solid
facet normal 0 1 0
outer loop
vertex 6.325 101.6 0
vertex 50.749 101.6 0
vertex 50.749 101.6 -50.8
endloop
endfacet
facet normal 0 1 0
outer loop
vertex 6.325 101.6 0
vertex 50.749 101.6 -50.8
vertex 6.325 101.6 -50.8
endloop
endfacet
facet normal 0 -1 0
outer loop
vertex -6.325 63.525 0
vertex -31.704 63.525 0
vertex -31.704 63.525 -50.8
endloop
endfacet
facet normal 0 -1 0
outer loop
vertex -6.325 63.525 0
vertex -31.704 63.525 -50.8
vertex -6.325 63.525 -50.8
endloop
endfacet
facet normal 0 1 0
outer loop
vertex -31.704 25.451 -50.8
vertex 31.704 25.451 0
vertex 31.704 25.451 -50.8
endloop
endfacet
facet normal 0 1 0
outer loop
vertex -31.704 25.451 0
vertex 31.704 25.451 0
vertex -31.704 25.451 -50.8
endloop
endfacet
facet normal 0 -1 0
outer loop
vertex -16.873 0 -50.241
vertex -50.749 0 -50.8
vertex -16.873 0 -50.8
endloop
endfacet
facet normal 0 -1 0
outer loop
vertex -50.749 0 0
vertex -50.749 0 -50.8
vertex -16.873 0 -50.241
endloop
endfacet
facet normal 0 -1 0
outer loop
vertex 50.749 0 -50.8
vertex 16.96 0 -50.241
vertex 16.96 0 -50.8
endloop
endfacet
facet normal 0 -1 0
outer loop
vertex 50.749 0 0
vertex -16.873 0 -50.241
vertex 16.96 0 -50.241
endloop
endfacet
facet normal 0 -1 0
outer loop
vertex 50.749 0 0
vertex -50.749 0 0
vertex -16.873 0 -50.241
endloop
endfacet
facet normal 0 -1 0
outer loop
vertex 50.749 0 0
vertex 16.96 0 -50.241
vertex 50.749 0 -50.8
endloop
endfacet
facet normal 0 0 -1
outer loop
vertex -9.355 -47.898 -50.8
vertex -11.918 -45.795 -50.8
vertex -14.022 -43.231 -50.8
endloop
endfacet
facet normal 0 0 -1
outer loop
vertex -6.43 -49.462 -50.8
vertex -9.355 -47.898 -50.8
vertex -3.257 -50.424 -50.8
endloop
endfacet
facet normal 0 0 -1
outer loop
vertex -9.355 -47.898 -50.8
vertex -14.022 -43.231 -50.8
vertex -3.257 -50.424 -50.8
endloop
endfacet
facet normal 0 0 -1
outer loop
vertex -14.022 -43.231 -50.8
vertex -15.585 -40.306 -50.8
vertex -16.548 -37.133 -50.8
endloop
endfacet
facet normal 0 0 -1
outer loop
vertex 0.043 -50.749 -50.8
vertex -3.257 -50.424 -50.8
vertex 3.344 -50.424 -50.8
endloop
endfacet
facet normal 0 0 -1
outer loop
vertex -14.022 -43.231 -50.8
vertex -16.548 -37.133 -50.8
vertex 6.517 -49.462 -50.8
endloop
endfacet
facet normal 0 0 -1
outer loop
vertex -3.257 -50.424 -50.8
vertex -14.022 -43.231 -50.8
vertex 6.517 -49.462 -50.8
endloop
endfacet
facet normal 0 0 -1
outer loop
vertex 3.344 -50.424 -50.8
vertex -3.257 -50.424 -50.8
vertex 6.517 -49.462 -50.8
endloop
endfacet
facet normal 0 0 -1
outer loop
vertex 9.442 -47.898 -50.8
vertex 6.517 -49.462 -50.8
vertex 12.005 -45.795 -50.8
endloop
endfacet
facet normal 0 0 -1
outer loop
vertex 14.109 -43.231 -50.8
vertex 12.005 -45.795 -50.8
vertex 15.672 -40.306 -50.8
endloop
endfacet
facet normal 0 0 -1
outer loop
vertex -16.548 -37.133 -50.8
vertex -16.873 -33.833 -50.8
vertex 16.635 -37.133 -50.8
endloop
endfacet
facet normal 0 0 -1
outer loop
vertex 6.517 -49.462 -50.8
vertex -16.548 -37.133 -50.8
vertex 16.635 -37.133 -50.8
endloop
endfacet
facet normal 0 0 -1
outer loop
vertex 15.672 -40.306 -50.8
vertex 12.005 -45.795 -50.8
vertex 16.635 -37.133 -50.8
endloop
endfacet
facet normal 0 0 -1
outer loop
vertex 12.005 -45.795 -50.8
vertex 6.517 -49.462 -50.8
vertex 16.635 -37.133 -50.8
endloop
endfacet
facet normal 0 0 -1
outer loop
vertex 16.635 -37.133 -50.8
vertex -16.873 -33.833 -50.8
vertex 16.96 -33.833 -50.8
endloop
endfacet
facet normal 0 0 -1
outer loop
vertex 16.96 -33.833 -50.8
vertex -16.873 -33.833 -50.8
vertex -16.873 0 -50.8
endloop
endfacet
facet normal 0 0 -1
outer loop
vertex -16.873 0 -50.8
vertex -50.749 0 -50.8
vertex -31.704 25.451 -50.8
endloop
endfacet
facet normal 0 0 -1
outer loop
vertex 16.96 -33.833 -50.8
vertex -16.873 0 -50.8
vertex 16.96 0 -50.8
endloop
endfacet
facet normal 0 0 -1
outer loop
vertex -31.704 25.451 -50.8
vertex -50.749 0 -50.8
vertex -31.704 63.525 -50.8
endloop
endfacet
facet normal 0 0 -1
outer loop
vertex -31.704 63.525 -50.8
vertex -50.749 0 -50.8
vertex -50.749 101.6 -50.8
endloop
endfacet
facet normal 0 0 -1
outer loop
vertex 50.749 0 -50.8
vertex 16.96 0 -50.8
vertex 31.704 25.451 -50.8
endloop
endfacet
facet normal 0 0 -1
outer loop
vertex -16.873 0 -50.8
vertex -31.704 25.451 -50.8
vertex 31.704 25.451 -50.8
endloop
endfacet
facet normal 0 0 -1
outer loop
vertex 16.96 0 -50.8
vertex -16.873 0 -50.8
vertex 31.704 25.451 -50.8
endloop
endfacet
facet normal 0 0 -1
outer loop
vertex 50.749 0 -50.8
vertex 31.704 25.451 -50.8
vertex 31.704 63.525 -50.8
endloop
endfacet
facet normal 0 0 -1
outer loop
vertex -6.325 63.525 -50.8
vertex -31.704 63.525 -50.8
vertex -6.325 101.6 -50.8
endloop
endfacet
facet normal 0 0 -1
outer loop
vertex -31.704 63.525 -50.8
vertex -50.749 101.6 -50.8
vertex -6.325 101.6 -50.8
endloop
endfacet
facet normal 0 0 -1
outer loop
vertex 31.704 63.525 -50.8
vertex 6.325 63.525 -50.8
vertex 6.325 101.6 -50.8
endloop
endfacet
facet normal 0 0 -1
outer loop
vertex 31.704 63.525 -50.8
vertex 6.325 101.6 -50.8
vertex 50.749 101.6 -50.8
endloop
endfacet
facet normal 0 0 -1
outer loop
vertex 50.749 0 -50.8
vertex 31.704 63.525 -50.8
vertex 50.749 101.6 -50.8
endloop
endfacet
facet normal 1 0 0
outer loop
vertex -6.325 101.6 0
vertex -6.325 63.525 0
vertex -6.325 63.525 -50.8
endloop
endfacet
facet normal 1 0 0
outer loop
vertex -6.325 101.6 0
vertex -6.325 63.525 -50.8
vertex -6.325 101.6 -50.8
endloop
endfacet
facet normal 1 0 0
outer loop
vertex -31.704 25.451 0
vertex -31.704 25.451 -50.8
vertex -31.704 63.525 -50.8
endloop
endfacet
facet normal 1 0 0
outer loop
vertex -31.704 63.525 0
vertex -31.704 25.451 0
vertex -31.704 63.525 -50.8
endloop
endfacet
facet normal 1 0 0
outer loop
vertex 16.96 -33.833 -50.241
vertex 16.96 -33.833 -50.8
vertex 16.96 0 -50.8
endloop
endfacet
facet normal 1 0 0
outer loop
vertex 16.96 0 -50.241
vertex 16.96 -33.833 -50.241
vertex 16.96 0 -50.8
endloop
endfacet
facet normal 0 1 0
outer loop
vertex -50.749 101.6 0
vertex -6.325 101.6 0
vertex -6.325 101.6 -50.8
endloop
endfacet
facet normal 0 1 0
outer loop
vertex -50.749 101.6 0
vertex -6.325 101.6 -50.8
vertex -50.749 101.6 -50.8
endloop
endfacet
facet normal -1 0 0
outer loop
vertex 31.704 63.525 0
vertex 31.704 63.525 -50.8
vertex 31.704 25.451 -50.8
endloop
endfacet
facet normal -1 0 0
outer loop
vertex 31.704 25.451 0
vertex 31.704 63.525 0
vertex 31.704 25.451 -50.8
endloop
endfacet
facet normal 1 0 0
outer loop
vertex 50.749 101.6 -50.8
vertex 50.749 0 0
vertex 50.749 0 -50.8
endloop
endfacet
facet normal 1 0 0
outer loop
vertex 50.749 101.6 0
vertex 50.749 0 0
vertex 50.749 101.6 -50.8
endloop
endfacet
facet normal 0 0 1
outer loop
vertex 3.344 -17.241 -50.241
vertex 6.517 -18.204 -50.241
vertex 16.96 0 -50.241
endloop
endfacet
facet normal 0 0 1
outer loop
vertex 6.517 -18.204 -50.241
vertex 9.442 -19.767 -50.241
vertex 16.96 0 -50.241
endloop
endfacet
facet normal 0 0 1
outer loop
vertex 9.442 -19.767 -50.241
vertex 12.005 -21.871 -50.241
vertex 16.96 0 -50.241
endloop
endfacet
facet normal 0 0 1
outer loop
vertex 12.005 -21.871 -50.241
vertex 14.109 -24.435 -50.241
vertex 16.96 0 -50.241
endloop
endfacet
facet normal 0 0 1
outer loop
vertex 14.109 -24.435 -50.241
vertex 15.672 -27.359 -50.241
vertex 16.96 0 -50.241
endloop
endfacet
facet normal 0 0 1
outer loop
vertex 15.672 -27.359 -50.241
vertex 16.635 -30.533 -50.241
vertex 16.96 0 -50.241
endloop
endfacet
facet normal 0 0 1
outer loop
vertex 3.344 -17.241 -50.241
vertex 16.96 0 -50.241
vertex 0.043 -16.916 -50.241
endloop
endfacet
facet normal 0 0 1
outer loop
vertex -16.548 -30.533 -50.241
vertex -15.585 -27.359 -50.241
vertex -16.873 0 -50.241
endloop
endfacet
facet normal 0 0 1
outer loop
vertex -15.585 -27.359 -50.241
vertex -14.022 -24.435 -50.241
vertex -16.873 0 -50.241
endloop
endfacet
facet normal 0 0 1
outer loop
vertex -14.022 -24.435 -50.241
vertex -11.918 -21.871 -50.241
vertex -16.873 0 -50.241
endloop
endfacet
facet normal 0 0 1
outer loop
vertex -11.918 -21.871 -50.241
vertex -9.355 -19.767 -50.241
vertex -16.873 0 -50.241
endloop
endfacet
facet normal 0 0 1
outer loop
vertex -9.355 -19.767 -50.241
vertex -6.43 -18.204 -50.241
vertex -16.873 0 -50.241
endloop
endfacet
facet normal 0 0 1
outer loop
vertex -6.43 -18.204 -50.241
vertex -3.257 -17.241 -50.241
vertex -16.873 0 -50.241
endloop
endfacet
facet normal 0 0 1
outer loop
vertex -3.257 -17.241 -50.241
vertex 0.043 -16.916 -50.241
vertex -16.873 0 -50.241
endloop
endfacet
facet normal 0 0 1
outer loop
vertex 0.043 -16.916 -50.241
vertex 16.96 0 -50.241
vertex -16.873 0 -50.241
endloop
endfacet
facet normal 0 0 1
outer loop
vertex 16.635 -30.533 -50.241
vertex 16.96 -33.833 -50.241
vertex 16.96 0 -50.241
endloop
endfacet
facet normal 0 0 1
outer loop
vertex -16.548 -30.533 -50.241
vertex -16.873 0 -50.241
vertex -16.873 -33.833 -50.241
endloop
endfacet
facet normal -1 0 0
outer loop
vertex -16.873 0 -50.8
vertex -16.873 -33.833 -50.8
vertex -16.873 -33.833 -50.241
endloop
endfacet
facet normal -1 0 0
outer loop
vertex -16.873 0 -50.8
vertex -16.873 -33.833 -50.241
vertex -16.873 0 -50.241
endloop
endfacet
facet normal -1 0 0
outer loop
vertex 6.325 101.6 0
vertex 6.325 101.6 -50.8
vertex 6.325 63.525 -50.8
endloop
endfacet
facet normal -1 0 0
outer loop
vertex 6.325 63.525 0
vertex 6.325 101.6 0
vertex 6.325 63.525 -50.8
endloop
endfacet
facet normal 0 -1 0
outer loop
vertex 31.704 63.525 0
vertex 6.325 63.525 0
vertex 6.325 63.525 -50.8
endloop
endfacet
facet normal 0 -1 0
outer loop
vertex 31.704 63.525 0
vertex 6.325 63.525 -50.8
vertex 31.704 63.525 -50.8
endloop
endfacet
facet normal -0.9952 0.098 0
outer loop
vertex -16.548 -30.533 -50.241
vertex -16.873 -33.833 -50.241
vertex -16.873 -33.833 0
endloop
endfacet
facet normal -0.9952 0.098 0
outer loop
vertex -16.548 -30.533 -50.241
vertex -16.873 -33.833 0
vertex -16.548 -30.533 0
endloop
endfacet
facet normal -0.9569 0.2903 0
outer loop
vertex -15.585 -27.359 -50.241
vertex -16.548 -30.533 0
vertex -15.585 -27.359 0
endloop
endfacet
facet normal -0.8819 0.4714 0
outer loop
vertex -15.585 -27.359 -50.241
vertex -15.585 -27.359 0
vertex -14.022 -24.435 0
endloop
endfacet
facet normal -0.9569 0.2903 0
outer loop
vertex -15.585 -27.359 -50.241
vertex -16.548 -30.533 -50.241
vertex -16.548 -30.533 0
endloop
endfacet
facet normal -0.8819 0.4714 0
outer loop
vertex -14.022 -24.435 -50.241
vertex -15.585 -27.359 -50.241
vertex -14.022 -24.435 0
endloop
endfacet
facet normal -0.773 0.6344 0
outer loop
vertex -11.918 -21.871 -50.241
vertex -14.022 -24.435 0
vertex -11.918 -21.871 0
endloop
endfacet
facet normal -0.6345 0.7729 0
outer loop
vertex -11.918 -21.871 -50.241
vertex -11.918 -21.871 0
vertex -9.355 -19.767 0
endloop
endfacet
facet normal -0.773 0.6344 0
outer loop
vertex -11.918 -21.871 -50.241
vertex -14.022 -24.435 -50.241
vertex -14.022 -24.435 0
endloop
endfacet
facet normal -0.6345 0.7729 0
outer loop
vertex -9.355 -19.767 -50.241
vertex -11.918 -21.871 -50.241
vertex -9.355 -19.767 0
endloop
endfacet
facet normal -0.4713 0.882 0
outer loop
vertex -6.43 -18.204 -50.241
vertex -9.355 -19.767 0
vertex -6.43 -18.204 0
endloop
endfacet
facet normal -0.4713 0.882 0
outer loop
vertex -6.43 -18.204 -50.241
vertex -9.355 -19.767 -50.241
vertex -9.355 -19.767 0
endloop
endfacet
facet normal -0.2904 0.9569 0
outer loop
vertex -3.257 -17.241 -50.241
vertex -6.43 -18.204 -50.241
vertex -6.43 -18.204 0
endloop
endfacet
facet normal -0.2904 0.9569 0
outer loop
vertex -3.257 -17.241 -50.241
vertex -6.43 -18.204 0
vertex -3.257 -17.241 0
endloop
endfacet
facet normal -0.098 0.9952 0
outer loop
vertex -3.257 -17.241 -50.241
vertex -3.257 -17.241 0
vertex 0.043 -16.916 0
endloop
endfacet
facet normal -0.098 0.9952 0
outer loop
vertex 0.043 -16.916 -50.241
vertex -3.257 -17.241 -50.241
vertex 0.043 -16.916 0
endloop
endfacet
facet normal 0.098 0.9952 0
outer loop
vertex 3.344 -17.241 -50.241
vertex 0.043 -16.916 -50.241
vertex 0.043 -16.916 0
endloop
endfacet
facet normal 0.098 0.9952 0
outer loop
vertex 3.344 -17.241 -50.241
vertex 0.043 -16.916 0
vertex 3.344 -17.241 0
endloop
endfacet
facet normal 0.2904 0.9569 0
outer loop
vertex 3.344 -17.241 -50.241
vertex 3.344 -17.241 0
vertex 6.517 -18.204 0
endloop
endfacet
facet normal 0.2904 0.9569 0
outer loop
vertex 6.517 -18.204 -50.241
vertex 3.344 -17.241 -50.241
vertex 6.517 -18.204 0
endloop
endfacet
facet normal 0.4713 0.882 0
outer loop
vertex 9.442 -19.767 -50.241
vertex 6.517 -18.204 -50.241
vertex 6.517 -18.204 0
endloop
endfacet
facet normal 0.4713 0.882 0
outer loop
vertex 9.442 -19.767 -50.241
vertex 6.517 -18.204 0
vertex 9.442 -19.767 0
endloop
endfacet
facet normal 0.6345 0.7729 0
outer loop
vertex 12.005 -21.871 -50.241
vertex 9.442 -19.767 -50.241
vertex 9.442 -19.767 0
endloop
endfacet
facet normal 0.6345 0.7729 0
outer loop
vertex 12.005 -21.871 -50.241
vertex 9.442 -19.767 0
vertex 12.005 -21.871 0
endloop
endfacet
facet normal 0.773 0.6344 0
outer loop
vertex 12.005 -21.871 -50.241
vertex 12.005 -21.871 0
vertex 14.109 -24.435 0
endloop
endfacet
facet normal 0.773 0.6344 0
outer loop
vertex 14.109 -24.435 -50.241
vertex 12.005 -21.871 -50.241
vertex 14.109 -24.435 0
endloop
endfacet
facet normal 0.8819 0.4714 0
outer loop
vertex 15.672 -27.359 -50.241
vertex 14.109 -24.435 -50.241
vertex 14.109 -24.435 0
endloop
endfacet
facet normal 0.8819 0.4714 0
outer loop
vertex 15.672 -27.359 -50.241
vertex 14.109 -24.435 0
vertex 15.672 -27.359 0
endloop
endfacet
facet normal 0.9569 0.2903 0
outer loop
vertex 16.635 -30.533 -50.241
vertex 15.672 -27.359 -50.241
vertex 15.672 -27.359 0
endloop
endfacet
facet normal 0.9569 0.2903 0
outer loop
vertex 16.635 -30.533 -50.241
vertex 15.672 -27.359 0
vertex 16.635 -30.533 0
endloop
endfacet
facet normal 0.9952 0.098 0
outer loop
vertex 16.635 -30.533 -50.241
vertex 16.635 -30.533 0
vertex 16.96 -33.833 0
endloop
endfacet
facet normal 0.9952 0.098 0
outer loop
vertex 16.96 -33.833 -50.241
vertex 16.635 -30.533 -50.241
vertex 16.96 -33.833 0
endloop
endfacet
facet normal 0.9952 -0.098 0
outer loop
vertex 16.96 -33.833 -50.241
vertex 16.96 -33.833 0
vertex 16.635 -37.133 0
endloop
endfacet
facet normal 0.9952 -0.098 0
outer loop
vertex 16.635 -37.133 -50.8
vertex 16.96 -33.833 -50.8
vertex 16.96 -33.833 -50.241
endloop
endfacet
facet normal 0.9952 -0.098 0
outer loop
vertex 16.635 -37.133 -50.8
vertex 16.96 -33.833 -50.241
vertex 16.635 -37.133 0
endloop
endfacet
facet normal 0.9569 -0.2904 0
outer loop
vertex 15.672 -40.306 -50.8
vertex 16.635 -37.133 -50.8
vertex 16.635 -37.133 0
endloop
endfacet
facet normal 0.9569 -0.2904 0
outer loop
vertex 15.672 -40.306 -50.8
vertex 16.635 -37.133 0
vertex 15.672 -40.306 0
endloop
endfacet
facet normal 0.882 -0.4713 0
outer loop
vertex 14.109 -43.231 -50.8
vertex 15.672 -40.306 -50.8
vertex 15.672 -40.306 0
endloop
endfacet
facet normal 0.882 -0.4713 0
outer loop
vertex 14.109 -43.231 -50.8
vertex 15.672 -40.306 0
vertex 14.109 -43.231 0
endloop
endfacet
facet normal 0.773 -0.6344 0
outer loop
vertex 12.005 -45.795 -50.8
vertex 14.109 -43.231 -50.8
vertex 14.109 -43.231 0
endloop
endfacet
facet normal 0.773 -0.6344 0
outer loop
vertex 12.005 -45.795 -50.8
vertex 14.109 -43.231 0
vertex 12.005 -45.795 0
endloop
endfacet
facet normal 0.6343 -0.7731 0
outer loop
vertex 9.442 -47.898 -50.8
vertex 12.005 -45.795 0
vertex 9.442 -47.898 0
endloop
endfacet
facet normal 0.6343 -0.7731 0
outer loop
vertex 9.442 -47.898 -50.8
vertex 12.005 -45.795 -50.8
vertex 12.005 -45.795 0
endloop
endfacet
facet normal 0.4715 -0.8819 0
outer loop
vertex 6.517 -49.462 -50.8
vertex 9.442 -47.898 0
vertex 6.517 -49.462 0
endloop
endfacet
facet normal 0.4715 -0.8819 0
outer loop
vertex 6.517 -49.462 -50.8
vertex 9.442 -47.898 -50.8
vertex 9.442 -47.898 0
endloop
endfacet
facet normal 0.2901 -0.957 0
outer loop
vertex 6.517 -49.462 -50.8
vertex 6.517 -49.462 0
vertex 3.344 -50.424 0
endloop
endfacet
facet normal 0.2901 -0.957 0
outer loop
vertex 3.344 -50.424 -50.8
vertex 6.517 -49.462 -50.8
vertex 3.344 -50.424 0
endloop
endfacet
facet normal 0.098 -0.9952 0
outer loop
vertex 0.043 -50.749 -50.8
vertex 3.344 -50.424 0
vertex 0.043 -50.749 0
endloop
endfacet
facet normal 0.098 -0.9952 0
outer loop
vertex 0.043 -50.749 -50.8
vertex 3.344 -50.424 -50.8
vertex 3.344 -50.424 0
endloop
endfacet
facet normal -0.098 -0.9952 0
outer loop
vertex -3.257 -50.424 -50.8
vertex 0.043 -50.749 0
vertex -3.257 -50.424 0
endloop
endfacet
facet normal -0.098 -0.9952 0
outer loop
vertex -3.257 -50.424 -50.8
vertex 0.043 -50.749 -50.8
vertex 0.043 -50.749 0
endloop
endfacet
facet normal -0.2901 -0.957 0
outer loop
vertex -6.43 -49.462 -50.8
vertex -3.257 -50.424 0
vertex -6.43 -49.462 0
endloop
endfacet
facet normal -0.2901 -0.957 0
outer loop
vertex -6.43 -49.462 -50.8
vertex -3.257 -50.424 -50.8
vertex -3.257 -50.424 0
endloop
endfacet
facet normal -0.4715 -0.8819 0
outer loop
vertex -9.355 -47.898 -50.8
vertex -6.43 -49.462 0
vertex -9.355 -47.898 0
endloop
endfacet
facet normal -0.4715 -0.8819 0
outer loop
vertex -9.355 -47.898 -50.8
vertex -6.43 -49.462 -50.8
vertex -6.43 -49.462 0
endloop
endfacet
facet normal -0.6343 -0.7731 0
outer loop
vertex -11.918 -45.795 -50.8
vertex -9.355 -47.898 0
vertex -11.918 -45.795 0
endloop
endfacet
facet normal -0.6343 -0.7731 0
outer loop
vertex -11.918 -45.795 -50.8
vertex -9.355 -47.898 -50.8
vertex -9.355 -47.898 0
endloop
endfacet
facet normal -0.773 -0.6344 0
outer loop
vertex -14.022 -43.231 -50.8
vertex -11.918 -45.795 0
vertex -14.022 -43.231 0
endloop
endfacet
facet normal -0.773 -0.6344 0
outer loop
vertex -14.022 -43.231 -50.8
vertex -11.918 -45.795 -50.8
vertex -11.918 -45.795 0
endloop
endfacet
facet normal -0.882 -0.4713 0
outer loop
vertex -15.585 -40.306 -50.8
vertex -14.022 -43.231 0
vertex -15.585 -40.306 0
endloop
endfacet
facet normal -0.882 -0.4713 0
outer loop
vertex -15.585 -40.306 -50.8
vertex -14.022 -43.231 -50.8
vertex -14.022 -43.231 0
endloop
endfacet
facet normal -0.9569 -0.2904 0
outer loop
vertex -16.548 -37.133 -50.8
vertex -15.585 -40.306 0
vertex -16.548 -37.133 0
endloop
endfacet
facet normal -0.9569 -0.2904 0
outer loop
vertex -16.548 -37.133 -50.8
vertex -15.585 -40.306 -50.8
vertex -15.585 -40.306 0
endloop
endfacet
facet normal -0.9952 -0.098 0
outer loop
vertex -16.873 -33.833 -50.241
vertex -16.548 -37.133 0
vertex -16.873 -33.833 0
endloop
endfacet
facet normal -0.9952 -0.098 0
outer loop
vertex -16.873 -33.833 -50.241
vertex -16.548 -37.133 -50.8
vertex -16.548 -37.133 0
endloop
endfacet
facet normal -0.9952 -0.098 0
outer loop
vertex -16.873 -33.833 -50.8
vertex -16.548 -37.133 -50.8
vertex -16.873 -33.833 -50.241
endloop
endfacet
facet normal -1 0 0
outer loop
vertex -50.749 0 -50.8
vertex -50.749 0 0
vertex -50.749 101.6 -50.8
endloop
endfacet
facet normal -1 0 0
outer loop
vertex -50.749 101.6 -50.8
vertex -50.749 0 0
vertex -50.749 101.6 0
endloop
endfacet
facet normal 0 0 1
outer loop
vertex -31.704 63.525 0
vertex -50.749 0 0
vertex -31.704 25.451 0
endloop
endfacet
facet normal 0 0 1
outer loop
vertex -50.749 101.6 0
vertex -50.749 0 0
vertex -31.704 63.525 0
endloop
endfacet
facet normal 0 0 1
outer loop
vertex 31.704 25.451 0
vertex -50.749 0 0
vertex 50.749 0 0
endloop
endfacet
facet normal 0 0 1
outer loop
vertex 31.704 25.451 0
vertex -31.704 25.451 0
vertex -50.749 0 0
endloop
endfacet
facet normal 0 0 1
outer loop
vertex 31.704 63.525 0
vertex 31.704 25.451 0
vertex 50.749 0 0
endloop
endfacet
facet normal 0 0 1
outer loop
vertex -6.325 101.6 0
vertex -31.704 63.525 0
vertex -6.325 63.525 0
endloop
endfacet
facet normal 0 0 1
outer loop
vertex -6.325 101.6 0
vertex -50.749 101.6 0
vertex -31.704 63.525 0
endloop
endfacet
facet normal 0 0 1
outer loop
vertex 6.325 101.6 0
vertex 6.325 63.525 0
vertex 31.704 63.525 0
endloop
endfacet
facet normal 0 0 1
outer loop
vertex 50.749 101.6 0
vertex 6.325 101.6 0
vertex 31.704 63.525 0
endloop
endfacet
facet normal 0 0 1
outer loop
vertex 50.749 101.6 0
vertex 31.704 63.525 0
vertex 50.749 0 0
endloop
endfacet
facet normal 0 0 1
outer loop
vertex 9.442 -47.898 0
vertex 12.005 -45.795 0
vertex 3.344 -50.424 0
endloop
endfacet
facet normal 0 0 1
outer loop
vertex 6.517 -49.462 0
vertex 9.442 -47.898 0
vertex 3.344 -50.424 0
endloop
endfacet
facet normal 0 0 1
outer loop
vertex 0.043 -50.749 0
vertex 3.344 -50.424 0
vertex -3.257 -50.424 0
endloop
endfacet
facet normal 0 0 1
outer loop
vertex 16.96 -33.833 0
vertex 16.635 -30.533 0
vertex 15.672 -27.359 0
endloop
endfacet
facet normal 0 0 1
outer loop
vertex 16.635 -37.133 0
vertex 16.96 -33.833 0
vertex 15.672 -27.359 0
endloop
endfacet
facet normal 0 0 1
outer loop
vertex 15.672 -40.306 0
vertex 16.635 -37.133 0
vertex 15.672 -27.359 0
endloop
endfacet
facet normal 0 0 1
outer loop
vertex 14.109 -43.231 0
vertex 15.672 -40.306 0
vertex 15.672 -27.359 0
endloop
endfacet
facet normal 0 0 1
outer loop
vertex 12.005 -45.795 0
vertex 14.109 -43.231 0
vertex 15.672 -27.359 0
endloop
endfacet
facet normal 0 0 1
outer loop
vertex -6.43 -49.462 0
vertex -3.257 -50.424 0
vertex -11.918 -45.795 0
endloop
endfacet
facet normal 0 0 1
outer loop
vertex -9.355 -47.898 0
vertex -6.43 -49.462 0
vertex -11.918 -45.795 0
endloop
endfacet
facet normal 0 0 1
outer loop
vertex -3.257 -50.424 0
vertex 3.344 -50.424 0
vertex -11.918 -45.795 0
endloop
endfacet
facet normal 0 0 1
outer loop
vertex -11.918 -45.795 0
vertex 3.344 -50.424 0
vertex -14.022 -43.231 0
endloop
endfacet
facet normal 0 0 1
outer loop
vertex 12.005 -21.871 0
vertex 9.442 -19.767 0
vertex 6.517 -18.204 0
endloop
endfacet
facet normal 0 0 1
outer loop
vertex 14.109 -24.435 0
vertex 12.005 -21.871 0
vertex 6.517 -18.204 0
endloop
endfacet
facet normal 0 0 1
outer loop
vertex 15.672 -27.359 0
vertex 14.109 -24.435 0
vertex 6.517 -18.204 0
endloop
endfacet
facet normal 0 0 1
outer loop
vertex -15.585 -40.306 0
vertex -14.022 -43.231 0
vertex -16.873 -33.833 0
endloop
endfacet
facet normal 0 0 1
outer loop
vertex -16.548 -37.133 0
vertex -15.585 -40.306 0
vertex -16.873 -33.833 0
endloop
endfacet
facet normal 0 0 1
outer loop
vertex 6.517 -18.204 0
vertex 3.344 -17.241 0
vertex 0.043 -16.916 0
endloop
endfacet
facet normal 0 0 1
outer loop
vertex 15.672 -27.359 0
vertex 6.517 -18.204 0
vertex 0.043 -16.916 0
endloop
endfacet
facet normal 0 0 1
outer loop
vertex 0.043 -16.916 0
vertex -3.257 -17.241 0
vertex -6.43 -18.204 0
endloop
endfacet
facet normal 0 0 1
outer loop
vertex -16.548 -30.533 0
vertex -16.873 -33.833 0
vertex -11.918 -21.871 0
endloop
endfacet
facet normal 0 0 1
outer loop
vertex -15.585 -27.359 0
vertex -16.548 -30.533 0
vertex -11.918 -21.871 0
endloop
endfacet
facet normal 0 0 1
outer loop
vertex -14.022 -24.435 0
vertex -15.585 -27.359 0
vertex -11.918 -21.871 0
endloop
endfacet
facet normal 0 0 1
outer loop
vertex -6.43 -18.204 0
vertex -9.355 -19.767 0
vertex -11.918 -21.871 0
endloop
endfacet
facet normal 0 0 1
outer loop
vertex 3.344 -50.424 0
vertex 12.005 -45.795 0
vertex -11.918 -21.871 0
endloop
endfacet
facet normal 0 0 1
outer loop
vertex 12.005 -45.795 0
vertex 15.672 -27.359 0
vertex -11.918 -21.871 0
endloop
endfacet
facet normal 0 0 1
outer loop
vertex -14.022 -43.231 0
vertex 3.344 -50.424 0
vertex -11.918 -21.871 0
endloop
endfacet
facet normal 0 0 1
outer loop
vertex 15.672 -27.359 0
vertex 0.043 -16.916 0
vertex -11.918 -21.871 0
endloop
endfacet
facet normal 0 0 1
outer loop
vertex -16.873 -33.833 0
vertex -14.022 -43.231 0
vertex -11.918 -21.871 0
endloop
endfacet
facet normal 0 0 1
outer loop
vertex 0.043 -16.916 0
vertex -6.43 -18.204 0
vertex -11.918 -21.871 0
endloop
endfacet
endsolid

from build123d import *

# Parameters (mm, degrees)
SKETCH4_W           = 50.7492
SKETCH4_H           = 101.6
BOSS_EXTRUDE2_DEPTH = 50.8
CUT_EXTRUDE2_DEPTH  = 125.413348563
SKETCH7_W           = 33.8328
SKETCH7_H           = 33.8328
BOSS_EXTRUDE3_DEPTH = 0.5588
SKETCH8_R           = 16.9164
BOSS_EXTRUDE4_DEPTH = 50.8


with BuildPart() as part:
    # Sketch4 → Boss-Extrude2 (new body)
    with BuildSketch(Plane.XY):
        with Locations((-25.3746, 50.8)):
            Rectangle(SKETCH4_W, SKETCH4_H)
        with Locations((25.3746, 50.8)):
            Rectangle(SKETCH4_W, SKETCH4_H)
    extrude(amount=-BOSS_EXTRUDE2_DEPTH)

    # Sketch5 → Cut-Extrude2 (cut, through all)
    with BuildSketch(Plane.XY):
        Polygon((-6.3246, 101.6), (6.3246, 101.6), (6.3246, 63.5254), (31.70428, 63.5254), (31.70428, 25.4508), (-31.70428, 25.4508), (-31.70428, 63.5254), (-6.3246, 63.5254), align=None)
    extrude(amount=-CUT_EXTRUDE2_DEPTH, mode=Mode.SUBTRACT)

    # Sketch7 → Boss-Extrude3 (add)
    with BuildSketch(Plane(origin=(0, 0, -50.8), x_dir=(-1, 0, 0), z_dir=(0, 0, -1))):
        with Locations((-0.043435031, -16.9164)):
            Rectangle(SKETCH7_W, SKETCH7_H)
    extrude(amount=-BOSS_EXTRUDE3_DEPTH)

    # Sketch8 → Boss-Extrude4 (add)
    with BuildSketch(Plane(origin=(0, 0, -50.8), x_dir=(-1, 0, 0), z_dir=(0, 0, -1))):
        with Locations((-0.043435031, -33.8328)):
            Circle(SKETCH8_R)
    extrude(amount=-BOSS_EXTRUDE4_DEPTH)


solid = part.part
